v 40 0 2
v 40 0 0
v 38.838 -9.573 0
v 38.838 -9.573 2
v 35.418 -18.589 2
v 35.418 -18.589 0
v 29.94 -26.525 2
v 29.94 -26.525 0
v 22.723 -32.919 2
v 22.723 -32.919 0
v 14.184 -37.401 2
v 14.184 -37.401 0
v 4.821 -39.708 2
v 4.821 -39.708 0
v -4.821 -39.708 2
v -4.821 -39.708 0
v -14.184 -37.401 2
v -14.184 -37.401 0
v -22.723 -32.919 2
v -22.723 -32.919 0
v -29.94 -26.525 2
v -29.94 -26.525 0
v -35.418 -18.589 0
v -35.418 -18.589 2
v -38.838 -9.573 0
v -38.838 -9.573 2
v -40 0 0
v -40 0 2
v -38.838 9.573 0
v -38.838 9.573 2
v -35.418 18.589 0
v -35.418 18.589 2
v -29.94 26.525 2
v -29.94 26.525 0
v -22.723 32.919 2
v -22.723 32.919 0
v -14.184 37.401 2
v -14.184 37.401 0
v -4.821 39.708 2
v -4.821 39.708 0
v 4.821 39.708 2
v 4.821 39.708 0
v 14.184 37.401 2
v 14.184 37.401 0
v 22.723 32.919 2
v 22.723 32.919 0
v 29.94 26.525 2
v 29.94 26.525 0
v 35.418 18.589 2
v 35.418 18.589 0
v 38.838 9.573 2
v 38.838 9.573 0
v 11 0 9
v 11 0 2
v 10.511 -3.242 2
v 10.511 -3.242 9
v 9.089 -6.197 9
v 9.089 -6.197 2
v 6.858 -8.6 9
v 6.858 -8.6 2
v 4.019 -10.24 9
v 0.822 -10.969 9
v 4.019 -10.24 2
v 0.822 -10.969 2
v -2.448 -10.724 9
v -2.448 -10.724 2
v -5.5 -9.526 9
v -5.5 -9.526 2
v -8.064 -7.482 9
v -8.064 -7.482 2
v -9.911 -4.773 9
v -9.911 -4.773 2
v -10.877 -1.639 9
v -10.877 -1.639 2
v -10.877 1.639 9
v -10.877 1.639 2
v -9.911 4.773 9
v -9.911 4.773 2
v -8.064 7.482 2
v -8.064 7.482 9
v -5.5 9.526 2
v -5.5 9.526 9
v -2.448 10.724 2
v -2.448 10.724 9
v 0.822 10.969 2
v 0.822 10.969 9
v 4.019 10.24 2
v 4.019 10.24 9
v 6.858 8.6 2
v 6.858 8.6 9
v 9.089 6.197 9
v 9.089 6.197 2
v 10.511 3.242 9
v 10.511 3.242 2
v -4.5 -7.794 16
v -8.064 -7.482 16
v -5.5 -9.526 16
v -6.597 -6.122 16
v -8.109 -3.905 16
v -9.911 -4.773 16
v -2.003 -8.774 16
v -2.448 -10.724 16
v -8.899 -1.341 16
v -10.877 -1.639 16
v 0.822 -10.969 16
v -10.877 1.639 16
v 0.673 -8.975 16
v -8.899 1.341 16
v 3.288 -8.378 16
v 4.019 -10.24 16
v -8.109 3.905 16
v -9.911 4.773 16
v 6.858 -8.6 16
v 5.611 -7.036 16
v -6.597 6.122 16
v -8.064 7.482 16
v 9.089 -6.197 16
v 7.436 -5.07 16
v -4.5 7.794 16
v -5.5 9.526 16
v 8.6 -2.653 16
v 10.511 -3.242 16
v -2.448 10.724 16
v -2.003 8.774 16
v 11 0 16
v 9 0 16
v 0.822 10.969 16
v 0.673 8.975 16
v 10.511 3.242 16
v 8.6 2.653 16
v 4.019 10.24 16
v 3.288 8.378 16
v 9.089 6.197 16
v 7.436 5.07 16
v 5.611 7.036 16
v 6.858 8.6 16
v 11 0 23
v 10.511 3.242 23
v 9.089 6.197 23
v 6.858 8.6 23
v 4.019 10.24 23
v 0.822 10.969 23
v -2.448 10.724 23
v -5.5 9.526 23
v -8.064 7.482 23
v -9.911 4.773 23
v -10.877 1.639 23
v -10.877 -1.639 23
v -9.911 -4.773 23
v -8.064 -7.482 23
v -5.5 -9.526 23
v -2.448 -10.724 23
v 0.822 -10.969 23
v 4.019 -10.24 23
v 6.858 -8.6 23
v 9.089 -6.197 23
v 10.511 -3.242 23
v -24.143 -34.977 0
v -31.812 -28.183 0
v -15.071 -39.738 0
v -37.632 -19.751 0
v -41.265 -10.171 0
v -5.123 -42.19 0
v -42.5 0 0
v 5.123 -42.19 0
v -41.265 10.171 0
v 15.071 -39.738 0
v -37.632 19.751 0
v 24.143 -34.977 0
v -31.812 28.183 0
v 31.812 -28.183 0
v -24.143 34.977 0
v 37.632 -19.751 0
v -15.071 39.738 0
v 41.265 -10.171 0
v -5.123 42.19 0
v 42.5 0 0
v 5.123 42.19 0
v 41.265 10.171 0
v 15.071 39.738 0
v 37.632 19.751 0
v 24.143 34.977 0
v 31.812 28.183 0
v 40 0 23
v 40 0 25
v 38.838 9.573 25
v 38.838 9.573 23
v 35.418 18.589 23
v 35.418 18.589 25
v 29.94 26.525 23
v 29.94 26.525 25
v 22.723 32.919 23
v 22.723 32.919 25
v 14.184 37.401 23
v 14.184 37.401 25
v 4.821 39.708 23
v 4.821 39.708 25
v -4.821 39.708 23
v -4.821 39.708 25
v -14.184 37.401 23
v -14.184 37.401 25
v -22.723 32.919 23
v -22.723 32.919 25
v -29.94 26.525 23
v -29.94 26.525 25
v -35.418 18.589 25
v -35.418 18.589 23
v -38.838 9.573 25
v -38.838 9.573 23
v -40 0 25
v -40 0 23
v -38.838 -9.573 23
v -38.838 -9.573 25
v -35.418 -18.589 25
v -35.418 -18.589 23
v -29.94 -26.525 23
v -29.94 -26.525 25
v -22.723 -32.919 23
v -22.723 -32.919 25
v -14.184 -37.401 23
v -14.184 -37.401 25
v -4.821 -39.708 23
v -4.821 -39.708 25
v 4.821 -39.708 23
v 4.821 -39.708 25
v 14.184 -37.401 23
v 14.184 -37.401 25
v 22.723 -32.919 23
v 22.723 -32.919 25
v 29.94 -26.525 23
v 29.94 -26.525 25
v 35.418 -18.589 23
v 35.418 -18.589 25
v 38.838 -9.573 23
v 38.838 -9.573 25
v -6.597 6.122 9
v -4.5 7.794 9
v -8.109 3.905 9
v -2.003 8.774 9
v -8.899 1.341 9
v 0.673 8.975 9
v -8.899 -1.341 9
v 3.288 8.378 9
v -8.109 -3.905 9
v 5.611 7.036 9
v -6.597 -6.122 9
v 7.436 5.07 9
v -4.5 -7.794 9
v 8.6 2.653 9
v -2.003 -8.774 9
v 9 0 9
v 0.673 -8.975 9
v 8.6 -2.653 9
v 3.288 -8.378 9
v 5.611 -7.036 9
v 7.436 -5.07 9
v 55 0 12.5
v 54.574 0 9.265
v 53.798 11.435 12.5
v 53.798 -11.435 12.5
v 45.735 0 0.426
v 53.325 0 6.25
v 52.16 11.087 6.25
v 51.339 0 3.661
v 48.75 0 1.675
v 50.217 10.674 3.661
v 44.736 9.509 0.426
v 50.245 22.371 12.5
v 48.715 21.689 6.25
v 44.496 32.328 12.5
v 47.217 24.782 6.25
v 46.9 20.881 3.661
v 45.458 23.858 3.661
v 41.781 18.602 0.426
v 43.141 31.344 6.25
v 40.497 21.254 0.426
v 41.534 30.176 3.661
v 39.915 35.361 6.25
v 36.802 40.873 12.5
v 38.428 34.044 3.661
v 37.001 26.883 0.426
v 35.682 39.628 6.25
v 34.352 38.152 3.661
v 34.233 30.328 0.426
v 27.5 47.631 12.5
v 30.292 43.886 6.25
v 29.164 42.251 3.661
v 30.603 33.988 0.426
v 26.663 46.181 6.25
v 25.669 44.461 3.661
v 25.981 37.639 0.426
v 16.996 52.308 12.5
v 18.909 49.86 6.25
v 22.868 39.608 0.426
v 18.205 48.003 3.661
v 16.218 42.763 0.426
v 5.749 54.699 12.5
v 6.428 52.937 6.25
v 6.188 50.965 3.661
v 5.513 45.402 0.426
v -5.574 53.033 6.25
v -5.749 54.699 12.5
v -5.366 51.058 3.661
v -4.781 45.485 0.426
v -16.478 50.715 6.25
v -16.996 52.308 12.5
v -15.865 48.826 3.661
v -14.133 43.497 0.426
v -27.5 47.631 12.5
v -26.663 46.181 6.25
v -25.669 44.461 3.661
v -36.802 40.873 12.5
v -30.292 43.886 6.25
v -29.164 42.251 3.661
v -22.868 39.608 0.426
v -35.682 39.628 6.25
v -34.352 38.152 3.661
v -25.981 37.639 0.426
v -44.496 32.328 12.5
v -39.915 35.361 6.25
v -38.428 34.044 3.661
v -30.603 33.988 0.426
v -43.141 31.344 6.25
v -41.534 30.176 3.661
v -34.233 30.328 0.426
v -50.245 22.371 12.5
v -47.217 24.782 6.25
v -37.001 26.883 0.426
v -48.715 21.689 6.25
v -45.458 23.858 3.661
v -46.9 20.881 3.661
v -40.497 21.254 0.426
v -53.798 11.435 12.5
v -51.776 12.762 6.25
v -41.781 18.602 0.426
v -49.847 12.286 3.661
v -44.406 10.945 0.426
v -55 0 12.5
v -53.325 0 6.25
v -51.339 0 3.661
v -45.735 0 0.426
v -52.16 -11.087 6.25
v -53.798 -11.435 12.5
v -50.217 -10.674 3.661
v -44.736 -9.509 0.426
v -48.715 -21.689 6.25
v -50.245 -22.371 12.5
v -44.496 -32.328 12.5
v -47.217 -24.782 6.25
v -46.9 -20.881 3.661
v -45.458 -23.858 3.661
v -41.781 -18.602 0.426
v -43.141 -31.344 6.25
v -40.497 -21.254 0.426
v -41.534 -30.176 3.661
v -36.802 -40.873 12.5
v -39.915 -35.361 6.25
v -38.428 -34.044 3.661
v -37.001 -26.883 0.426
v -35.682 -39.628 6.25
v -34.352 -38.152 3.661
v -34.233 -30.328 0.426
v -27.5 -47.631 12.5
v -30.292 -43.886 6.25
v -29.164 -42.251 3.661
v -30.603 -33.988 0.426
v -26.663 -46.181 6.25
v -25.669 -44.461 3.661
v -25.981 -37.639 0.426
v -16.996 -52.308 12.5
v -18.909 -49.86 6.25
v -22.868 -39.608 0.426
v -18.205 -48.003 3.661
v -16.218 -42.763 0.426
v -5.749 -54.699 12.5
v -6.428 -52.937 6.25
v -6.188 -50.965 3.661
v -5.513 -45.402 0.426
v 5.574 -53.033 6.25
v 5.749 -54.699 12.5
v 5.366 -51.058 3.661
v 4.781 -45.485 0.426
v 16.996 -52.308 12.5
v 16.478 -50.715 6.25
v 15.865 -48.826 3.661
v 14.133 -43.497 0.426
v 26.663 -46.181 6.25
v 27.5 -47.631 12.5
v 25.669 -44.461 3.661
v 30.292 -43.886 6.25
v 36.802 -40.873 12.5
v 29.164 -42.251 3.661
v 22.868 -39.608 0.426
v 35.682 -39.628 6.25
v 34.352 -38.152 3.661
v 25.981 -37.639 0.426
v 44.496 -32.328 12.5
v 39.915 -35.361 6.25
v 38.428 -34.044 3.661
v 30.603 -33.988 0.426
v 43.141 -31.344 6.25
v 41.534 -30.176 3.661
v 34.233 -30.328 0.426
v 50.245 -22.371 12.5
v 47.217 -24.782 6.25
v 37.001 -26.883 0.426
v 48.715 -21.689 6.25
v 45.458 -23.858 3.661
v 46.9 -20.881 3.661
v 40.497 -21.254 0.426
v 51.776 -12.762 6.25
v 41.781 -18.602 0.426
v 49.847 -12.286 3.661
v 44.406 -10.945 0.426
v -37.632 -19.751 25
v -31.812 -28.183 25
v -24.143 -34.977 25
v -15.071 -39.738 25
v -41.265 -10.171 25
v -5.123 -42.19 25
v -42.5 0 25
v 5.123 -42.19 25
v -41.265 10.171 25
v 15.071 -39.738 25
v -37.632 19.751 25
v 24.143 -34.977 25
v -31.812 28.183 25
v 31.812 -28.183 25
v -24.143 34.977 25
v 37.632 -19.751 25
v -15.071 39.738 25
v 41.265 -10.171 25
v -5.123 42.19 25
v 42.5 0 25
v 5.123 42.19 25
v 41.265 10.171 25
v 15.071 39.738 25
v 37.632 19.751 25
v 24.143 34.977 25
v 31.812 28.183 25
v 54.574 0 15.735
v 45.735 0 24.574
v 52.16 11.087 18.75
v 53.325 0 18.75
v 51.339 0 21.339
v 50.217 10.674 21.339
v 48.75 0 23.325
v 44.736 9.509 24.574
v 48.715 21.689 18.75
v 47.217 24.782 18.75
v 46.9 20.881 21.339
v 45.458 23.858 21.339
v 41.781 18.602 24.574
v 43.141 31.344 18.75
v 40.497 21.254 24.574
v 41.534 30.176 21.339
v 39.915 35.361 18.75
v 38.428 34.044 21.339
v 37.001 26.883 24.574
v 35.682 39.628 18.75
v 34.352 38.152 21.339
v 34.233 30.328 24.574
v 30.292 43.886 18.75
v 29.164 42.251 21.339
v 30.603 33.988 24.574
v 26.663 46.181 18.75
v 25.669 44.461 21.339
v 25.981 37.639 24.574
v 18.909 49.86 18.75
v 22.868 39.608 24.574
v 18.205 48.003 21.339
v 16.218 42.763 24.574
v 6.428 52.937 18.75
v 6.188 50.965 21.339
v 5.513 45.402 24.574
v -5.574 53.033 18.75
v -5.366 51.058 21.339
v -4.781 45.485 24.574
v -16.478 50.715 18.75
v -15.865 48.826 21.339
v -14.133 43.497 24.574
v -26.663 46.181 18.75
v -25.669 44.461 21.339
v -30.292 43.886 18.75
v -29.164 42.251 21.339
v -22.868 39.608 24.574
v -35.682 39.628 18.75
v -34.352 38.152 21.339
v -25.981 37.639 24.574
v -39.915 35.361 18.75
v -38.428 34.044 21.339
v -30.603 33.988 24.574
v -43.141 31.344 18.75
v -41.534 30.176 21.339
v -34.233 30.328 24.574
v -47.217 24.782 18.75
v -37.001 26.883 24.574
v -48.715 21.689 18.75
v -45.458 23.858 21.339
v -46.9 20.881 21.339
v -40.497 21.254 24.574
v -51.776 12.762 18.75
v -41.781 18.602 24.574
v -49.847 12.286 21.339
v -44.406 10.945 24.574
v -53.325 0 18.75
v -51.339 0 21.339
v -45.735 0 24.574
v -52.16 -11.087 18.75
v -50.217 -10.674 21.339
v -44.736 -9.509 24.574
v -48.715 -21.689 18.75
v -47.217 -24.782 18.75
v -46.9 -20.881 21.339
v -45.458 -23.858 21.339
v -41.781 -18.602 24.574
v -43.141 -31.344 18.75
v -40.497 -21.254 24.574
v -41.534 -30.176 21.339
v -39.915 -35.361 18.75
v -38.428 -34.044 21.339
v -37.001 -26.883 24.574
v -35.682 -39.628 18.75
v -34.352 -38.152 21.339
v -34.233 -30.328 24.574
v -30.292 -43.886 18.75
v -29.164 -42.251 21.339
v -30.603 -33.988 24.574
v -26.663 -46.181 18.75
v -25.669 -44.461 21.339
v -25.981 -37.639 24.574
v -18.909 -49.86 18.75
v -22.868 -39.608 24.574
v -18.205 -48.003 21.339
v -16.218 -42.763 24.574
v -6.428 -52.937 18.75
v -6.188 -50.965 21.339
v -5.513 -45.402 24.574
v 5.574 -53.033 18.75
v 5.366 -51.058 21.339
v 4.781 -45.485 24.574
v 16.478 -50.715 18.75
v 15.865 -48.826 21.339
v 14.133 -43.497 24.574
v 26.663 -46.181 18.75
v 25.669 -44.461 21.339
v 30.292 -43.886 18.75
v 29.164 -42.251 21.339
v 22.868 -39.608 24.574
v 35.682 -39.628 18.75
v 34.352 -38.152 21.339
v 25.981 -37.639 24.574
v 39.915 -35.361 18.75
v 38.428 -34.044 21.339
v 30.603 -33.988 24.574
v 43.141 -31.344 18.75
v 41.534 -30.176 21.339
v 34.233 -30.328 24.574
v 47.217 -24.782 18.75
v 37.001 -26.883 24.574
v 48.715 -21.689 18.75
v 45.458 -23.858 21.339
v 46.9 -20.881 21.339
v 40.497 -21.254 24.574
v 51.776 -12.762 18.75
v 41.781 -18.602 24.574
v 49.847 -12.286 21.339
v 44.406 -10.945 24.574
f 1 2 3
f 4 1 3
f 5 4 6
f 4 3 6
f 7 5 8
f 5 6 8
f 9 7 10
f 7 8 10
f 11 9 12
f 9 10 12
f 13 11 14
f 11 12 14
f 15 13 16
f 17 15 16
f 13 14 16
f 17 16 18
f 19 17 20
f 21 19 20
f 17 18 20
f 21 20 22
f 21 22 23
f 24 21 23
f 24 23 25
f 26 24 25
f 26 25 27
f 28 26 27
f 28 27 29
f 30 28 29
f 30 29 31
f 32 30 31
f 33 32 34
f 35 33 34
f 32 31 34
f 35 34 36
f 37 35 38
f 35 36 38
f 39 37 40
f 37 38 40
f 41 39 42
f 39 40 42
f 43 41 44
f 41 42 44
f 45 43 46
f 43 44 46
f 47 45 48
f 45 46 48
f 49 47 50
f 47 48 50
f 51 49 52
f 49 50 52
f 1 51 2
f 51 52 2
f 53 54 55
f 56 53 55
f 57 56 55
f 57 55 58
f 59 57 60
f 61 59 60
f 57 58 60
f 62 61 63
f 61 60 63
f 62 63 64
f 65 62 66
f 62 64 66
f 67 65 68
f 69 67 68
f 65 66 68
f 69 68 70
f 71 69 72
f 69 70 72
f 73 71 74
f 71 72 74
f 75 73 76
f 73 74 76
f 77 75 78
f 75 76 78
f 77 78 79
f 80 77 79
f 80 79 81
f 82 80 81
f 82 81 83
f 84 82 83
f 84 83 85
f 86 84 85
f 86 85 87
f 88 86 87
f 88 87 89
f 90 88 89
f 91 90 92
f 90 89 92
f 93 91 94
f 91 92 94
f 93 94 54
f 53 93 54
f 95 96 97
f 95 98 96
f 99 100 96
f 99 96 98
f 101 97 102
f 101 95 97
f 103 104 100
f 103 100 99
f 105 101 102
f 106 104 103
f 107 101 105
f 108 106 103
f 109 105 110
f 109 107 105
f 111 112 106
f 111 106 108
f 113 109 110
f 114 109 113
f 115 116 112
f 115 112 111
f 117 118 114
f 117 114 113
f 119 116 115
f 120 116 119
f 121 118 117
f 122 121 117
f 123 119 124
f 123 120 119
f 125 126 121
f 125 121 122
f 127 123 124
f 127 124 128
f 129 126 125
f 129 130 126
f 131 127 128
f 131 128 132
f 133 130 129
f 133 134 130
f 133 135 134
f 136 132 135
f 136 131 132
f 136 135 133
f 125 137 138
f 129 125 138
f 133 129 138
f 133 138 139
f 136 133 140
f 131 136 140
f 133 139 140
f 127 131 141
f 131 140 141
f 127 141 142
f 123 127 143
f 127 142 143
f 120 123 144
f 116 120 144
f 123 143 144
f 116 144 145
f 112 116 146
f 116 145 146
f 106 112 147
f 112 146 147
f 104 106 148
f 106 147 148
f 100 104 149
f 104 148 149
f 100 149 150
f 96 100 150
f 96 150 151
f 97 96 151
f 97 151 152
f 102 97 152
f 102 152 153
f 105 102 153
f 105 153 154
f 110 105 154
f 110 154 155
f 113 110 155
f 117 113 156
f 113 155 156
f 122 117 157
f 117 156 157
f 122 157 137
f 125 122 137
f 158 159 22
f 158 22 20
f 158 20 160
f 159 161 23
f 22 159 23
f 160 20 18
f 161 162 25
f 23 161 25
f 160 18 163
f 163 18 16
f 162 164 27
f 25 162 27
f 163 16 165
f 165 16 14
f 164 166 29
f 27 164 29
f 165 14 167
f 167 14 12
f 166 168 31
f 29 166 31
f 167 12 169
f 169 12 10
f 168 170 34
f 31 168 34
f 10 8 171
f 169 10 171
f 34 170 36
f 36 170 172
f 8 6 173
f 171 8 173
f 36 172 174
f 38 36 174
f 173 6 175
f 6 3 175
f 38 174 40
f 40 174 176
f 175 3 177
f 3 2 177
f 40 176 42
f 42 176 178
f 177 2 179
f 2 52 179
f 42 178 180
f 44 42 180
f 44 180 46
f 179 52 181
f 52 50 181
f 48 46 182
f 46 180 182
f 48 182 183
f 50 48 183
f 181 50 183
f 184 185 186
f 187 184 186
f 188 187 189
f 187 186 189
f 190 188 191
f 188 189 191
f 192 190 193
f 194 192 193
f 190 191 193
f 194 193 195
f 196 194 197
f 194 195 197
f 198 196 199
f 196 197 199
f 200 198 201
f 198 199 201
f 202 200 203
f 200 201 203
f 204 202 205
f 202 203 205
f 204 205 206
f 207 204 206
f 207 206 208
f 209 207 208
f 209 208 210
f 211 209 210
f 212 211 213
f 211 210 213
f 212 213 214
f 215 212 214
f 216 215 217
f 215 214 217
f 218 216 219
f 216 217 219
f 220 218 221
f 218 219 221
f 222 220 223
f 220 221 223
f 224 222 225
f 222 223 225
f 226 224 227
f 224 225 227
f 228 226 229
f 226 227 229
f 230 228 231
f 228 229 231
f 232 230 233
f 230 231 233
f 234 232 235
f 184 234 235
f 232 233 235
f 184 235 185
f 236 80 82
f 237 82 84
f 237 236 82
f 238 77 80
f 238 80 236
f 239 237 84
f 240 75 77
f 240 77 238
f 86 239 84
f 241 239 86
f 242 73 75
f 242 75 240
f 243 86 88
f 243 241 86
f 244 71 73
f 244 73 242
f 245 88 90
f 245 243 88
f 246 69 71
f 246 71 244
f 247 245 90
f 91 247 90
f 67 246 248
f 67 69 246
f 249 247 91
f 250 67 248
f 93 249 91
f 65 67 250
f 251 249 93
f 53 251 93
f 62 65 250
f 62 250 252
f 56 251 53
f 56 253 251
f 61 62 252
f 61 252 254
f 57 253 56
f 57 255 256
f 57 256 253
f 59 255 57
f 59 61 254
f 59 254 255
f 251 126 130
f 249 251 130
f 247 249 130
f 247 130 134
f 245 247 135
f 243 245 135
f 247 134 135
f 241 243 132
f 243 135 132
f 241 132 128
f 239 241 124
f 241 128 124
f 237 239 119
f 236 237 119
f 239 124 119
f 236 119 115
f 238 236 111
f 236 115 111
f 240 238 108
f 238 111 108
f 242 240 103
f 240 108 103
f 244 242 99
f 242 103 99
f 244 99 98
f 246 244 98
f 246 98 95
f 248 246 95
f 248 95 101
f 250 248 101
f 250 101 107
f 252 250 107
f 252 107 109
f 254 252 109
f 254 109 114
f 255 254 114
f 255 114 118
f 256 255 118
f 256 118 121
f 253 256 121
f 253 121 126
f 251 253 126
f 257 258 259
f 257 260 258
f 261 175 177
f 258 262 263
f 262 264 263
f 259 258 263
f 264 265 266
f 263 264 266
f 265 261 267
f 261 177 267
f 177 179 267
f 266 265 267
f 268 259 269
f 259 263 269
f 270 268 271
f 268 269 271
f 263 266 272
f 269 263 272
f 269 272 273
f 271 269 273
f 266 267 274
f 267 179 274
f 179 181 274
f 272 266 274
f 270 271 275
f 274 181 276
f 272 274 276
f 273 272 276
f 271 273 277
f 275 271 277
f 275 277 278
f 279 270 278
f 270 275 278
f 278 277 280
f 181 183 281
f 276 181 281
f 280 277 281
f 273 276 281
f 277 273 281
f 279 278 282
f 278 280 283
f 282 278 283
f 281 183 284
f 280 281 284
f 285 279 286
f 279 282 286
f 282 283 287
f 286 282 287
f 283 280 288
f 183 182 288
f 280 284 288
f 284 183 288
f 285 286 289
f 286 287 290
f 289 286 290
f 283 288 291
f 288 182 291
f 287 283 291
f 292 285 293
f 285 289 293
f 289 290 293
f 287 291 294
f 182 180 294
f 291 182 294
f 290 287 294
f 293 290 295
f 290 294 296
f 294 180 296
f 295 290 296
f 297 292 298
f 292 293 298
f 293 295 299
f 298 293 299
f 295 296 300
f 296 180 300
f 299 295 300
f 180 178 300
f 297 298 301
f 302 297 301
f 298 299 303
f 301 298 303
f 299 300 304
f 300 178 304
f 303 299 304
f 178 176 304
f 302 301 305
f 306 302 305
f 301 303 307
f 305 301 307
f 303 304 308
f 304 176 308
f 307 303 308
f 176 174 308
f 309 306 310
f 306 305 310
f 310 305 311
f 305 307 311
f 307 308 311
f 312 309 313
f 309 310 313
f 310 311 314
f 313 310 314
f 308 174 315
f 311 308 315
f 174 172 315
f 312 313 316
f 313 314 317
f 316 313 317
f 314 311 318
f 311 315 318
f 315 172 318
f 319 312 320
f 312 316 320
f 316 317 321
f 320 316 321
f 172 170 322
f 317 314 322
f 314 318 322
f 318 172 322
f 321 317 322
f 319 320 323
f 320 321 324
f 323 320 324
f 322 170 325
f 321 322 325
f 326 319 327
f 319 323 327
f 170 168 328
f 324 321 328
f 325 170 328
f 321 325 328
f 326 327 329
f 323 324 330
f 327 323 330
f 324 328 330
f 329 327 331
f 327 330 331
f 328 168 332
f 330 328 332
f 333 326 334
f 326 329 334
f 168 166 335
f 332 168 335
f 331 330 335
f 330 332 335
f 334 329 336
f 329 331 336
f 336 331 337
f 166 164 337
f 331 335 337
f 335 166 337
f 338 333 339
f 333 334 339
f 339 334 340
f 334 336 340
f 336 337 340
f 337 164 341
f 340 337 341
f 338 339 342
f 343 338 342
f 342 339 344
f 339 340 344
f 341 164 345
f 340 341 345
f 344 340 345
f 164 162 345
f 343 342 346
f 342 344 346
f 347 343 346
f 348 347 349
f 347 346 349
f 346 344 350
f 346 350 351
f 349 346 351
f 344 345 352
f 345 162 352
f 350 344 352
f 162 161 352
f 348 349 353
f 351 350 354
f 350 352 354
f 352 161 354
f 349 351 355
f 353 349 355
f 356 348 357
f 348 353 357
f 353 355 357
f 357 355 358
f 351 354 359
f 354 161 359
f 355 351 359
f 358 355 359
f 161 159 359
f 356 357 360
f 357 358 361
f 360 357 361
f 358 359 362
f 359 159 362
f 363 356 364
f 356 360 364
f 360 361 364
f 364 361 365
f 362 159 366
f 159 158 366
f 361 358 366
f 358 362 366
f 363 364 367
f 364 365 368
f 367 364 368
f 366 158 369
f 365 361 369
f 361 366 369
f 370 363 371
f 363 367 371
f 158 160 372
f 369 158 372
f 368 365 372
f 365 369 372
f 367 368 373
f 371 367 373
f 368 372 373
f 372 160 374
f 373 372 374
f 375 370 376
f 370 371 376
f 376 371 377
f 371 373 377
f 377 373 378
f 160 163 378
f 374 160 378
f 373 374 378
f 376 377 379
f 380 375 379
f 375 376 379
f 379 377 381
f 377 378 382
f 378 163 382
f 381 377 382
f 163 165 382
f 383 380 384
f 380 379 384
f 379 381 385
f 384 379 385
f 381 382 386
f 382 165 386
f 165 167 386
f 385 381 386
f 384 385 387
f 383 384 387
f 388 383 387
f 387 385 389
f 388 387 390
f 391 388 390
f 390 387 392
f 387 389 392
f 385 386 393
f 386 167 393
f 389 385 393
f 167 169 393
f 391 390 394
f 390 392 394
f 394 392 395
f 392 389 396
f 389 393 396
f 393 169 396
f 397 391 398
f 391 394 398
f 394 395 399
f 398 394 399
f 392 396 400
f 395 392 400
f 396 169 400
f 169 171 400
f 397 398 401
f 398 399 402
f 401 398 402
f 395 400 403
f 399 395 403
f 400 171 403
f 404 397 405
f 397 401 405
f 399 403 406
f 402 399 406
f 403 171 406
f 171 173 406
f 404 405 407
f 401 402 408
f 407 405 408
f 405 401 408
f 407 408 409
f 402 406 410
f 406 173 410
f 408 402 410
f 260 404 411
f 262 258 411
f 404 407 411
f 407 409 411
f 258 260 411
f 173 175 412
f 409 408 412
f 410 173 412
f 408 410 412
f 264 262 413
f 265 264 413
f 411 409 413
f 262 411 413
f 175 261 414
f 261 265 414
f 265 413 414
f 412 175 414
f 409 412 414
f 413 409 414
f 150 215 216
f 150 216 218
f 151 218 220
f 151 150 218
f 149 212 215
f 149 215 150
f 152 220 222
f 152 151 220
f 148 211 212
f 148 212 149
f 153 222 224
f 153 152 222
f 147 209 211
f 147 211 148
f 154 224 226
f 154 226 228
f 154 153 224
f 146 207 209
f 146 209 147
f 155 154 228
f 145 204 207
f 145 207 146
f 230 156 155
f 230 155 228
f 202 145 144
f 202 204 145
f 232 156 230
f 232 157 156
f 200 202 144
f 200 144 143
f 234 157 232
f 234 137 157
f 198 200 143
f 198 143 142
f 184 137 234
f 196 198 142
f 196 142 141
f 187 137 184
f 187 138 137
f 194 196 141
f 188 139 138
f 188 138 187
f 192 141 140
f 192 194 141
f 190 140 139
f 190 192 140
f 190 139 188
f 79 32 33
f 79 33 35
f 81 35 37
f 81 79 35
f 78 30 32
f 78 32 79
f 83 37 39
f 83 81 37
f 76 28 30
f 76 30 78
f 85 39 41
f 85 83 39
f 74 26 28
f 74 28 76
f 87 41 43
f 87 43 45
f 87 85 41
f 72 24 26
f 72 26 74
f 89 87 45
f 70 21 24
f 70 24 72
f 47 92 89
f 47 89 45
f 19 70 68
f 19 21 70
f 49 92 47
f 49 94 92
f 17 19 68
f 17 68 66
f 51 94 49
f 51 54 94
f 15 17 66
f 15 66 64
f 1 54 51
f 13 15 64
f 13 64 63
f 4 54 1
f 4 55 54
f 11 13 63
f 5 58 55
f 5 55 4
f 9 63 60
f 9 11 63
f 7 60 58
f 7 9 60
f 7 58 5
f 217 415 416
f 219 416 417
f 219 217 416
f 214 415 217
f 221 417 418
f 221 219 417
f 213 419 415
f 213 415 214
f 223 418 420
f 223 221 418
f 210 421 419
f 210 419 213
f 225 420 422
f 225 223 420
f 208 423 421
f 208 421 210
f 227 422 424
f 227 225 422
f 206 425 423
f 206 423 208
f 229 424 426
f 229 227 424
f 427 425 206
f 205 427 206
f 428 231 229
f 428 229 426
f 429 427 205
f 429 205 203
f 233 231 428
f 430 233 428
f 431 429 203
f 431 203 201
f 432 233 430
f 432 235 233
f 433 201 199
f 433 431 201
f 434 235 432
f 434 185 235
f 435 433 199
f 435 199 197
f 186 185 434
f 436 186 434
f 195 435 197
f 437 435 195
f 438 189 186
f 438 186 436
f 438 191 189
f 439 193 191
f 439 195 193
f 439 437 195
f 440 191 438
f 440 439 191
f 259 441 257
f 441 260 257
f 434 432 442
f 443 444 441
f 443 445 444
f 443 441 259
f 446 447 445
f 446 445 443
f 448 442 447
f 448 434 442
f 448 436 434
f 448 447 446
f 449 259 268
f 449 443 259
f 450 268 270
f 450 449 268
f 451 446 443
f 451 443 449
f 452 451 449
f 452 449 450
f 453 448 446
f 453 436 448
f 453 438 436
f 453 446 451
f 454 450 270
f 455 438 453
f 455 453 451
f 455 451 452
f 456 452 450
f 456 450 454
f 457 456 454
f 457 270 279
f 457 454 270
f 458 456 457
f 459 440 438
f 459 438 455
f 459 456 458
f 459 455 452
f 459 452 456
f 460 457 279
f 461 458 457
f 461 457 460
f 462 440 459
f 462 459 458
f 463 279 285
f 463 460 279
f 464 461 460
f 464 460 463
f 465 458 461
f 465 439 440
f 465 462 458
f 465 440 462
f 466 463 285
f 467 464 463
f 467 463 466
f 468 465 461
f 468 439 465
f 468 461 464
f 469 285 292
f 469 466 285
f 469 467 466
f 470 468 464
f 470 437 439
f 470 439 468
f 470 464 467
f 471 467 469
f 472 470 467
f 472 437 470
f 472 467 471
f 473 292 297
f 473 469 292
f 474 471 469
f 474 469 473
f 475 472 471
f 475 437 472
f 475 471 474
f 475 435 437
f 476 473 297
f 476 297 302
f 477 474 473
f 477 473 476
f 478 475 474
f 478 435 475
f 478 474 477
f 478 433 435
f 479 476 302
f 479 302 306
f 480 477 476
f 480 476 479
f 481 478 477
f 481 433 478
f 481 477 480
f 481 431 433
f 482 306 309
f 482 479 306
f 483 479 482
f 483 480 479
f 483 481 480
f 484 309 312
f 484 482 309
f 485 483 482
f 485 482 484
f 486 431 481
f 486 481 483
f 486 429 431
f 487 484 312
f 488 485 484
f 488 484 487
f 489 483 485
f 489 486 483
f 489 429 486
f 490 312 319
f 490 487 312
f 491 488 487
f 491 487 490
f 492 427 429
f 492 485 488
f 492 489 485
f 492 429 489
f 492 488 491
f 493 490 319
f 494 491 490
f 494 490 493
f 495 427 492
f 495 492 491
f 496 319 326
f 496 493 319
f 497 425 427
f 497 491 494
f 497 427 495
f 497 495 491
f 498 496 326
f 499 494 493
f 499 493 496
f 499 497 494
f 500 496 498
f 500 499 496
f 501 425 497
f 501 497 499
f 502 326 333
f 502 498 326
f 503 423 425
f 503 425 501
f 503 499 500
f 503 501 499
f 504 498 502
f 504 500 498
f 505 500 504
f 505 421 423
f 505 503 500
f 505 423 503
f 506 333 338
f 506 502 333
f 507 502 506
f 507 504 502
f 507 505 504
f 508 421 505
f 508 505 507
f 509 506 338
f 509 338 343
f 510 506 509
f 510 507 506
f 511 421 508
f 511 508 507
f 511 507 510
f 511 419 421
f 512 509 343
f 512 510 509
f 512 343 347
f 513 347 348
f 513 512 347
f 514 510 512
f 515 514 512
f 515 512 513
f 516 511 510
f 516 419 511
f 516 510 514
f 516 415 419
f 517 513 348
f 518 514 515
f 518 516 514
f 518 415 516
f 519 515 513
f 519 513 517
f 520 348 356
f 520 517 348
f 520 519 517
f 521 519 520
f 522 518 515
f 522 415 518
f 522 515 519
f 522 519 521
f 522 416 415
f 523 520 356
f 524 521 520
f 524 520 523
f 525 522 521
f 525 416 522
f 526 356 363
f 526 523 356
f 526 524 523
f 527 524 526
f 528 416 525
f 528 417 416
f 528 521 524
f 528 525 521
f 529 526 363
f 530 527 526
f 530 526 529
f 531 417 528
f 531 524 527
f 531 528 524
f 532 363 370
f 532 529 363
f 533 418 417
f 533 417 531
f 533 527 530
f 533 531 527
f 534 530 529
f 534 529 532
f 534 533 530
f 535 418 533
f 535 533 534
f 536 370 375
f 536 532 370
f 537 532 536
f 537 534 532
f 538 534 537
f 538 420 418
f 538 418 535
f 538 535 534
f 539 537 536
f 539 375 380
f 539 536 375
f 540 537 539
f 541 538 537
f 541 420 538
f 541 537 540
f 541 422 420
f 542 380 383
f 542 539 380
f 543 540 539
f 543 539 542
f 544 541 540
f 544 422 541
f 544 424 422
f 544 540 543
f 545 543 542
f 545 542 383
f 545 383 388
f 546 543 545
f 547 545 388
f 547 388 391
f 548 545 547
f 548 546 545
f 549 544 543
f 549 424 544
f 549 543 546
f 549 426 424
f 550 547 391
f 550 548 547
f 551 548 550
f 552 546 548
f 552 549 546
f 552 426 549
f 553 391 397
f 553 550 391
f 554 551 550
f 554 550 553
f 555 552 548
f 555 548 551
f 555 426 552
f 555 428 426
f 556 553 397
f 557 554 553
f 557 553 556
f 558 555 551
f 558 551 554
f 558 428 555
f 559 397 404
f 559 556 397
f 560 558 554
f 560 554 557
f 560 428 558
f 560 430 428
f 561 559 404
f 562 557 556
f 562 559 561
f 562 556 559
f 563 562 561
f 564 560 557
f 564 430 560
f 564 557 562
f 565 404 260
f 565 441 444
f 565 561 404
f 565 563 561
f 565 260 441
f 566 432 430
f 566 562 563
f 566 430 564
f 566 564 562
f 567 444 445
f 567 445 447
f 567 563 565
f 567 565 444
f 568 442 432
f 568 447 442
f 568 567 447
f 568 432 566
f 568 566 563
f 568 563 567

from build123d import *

# Parameters (mm, degrees)
F0_R      = 55
F1_DEPTH  = 25
F2_R      = 40
F3_DEPTH  = 2
F4_R      = 11
F5_DEPTH  = 7
F6_R      = 40
F7_DEPTH  = 2
F8_R      = 11
F9_DEPTH  = 7
F10_R     = 9
F11_DEPTH = 25
F12_R     = 12.49999


# Not quite as in the source:
# - a fillet or chamfer is up to 0.001 mm smaller than in the source, because OpenCascade refuses the exact size


with BuildPart() as f1:
    # F0 (on Top) → F1 (new body)
    with BuildSketch(Plane.XY):
        Circle(F0_R)
    extrude(amount=F1_DEPTH)

    # F2 (on face) → F3 (cut)
    with BuildSketch(Plane.XY.offset(25)):
        Circle(F2_R)
    extrude(amount=-F3_DEPTH, mode=Mode.SUBTRACT)

    # F4 (on face) → F5 (cut)
    with BuildSketch(Plane.XY.offset(23)):
        Circle(F4_R)
    extrude(amount=-F5_DEPTH, mode=Mode.SUBTRACT)

    # F6 (on face) → F7 (cut)
    with BuildSketch(Plane(origin=(0, 0, 0), x_dir=(1, 0, 0), z_dir=(0, 0, -1))):
        Circle(F6_R)
    extrude(amount=-F7_DEPTH, mode=Mode.SUBTRACT)

    # F8 (on face) → F9 (cut)
    with BuildSketch(Plane(origin=(0, 0, 2), x_dir=(1, 0, 0), z_dir=(0, 0, -1))):
        Circle(F8_R)
    extrude(amount=-F9_DEPTH, mode=Mode.SUBTRACT)

    # F10 (on face) → F11 (cut)
    with BuildSketch(Plane.XY.offset(16)):
        Circle(F10_R)
    extrude(amount=-F11_DEPTH, mode=Mode.SUBTRACT)

    # F12 (radius 12.5 in the source; OpenCascade refuses exactly that, so slightly less here)
    f12_edges = [f1.edges().sort_by_distance(p)[0] for p in [
        (-55, 0, 25),
        (-55, 0, 0),
    ]]
    fillet(f12_edges, radius=F12_R)


solid = f1.part
